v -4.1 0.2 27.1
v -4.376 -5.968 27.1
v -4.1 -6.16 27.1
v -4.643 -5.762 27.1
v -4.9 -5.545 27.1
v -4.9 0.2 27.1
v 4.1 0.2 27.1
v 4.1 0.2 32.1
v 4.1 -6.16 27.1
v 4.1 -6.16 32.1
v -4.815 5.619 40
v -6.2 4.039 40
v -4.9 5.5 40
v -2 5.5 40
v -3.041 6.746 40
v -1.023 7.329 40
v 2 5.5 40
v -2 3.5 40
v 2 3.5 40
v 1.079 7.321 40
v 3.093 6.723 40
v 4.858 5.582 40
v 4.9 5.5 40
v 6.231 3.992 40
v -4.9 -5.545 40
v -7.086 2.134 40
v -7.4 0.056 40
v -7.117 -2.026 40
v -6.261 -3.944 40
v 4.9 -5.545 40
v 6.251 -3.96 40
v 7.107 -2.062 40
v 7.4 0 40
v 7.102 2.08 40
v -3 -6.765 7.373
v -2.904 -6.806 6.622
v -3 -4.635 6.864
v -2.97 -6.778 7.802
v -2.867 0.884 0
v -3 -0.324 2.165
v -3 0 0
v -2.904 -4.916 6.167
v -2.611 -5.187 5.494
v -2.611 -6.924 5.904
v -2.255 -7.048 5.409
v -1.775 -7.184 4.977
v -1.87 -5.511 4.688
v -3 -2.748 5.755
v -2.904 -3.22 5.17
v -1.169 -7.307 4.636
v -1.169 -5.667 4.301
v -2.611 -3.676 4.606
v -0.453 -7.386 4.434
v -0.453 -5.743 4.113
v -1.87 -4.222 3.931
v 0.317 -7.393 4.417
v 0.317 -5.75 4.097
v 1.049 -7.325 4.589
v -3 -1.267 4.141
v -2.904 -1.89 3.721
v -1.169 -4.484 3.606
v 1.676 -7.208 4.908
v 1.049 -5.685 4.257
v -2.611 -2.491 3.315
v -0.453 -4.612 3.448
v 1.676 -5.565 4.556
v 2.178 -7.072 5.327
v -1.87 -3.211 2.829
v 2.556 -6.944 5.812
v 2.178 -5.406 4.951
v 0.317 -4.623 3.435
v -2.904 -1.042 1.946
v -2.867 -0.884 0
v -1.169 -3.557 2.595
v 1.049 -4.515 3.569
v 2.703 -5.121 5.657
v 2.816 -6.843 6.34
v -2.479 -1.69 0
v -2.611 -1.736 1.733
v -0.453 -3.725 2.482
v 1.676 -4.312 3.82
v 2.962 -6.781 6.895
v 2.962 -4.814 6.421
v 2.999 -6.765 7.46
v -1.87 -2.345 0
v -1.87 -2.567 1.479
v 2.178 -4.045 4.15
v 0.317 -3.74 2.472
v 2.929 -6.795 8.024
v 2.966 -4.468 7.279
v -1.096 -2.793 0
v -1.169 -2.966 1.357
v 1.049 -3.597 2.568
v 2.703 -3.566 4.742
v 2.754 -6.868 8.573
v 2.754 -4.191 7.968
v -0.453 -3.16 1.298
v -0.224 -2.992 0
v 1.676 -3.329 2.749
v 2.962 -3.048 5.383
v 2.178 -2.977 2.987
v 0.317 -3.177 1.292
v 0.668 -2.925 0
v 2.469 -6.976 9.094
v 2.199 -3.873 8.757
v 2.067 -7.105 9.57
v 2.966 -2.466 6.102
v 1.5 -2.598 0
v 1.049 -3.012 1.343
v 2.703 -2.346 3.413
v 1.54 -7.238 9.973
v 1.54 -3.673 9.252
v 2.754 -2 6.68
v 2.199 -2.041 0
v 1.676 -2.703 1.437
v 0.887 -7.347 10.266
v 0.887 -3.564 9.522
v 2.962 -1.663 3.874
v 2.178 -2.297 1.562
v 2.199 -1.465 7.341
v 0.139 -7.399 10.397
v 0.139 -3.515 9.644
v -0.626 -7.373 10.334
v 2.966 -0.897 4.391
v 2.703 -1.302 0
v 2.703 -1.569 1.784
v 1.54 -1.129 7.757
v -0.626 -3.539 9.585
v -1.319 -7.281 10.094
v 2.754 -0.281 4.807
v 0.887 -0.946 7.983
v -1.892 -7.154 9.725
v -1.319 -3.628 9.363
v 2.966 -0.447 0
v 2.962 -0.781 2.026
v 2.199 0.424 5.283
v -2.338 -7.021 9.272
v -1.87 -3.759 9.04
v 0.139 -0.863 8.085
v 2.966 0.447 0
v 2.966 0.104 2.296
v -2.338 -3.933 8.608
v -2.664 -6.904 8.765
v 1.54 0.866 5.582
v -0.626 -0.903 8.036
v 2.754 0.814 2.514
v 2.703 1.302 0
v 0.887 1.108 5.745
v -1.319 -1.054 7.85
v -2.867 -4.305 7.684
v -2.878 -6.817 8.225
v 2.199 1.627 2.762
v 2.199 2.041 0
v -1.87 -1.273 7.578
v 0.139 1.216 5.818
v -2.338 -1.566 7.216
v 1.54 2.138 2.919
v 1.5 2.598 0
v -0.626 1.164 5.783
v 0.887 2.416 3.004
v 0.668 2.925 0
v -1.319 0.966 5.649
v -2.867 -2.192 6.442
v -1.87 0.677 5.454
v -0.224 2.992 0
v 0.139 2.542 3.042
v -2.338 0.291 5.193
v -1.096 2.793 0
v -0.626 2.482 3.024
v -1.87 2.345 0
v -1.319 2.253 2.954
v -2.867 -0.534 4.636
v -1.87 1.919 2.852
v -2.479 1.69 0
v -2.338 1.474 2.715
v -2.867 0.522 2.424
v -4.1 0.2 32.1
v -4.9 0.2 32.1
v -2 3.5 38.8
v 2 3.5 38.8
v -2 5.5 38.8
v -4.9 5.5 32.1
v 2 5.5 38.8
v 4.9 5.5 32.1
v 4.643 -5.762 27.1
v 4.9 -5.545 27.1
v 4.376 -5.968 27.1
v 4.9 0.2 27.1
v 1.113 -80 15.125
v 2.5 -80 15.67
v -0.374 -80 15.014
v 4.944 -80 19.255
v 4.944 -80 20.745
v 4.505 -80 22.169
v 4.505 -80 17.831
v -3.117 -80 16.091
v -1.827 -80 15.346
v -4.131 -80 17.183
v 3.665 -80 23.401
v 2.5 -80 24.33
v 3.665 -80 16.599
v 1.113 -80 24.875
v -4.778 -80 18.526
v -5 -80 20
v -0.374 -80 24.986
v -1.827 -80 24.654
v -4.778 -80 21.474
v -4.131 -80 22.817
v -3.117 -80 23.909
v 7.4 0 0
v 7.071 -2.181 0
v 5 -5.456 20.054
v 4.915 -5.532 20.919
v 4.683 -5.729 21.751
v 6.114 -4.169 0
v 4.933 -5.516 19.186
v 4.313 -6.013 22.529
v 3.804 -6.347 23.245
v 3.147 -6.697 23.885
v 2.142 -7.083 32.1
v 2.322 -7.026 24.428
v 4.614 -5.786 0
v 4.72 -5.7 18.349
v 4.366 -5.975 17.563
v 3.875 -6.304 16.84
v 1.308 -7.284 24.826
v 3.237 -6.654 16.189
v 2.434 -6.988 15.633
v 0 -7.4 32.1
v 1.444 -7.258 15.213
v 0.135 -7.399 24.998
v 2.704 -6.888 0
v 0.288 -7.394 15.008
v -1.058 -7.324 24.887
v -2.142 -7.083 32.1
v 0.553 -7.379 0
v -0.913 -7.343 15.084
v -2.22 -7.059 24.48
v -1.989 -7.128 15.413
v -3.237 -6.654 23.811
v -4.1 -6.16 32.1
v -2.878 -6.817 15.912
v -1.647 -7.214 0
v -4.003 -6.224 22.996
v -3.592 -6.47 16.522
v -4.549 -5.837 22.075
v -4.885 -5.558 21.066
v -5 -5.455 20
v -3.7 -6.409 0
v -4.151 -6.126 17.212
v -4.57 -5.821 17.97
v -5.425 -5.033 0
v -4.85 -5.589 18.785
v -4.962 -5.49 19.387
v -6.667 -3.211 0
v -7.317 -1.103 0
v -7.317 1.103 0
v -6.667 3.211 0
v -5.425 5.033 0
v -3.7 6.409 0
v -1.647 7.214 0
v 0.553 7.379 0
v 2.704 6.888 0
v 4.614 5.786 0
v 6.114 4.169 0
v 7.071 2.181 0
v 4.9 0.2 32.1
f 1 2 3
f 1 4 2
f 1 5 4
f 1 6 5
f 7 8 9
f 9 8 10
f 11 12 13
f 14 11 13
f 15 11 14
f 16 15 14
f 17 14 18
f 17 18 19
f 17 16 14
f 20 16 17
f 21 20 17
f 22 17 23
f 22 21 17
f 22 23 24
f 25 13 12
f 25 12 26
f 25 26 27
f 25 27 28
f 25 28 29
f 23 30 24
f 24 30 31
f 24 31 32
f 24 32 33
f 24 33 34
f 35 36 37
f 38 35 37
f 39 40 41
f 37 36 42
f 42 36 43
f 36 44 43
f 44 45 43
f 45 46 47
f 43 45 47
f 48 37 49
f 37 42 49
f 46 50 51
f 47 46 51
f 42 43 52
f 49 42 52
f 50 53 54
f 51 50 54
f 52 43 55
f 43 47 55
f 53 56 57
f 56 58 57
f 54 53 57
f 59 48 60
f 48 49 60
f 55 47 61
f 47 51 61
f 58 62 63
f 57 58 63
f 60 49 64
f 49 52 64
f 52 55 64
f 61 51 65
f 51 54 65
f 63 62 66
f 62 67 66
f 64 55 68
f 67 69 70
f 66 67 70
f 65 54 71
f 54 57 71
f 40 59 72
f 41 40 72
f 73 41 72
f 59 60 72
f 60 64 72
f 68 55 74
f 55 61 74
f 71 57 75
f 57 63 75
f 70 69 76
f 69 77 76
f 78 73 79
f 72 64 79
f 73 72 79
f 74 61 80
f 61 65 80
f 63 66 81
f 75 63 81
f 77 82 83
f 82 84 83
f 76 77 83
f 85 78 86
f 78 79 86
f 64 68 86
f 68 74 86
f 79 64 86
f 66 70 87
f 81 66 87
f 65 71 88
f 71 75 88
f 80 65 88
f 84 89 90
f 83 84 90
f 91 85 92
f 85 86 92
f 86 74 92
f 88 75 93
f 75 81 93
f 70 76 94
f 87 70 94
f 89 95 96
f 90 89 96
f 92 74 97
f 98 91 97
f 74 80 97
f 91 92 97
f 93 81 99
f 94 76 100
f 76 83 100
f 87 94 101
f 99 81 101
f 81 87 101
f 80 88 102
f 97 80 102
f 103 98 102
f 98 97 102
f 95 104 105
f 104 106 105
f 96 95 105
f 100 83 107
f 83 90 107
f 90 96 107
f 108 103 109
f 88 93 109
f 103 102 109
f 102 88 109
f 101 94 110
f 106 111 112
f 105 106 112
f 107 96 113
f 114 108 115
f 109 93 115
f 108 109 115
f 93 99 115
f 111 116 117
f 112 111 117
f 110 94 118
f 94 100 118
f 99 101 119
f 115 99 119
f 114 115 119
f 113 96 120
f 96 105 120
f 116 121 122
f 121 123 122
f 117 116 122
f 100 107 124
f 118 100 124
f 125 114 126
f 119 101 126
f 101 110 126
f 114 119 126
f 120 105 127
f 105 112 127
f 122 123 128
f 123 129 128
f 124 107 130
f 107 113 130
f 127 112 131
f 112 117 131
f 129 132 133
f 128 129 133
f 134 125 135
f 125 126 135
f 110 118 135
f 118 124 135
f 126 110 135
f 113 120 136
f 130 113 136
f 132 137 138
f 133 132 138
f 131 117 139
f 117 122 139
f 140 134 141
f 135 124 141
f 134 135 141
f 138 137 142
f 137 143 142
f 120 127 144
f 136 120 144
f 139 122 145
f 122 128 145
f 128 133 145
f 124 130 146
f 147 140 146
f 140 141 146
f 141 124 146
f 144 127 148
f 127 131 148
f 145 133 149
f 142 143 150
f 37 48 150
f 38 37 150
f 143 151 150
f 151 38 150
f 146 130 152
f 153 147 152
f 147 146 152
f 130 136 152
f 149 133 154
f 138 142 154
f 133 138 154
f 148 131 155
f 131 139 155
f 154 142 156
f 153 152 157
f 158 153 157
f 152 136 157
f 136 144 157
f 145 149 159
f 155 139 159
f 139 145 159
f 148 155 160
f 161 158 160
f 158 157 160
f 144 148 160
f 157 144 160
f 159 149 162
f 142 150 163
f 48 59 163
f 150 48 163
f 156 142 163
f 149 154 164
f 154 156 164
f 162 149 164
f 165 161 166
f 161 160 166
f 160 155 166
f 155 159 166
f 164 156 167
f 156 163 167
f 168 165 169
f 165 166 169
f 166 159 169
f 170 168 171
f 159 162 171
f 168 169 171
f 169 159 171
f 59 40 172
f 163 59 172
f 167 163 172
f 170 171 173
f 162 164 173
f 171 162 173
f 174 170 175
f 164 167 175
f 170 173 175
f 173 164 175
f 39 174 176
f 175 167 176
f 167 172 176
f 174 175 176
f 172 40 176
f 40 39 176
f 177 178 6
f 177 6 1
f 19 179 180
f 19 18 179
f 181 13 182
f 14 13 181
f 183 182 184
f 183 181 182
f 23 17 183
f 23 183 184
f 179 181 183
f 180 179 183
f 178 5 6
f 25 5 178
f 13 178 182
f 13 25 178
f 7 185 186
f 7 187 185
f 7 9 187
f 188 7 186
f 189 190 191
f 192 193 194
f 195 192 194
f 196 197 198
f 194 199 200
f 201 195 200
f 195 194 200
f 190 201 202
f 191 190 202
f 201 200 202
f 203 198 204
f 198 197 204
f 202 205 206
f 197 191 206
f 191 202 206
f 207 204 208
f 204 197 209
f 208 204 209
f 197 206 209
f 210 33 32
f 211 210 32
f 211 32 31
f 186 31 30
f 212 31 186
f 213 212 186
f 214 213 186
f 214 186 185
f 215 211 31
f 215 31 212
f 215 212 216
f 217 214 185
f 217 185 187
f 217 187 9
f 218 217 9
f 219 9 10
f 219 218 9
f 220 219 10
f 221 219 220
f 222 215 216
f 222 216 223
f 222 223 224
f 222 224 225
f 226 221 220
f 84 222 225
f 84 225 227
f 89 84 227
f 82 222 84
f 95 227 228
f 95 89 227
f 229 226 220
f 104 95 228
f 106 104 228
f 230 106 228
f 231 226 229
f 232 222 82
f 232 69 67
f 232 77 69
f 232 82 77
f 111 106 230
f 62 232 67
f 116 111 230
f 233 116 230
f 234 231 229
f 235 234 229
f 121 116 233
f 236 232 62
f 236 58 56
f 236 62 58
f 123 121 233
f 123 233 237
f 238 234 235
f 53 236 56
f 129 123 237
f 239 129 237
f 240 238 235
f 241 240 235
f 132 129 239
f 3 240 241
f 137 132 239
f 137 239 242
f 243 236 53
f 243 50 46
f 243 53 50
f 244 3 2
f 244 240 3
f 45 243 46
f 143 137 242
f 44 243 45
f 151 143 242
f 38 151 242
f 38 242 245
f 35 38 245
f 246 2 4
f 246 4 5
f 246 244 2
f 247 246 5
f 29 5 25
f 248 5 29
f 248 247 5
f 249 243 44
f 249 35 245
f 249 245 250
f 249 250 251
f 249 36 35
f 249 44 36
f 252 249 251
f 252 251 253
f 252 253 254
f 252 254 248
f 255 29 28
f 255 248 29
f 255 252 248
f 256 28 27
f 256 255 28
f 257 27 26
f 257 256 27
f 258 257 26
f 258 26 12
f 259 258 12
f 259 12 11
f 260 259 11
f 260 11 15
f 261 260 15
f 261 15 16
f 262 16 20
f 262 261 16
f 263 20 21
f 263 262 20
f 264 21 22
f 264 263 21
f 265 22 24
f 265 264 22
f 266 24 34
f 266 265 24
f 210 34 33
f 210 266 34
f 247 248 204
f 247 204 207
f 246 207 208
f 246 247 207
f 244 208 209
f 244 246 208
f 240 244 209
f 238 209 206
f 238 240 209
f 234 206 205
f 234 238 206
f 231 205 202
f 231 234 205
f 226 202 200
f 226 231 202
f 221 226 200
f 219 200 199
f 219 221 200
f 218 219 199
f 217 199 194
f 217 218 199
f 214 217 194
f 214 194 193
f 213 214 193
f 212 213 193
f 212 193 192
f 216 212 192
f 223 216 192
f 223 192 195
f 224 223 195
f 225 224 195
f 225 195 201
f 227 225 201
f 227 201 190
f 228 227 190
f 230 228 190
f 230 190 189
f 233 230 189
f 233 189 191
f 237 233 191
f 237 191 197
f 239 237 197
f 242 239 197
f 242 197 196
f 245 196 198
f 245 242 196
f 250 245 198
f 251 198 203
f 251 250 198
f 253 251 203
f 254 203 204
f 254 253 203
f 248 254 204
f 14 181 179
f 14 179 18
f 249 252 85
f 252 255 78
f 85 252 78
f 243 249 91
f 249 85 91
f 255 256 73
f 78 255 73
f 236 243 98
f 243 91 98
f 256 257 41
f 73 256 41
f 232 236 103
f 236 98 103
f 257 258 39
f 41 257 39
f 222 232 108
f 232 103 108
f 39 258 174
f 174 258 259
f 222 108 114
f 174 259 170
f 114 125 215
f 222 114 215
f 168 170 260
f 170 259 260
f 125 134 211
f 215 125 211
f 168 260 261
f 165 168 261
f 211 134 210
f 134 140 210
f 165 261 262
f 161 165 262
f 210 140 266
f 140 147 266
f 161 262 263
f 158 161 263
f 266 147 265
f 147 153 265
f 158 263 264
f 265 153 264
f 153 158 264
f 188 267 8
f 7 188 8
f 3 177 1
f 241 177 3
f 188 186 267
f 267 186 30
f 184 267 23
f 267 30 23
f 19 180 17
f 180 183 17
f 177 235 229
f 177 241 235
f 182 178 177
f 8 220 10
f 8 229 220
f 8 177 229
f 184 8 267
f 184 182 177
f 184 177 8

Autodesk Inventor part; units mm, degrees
ref_plane "YZ Plane" through (0, 0, 0) normal (1, 0, 0) x (0, 1, 0)
ref_plane "XZ Plane" through (0, 0, 0) normal (0, 1, 0) x (-1, 0, 0)
ref_plane "XY Plane" through (0, 0, 0) normal (0, 0, 1) x (1, 0, 0)
sketch "Sketch1" plane through (0, 0, 0) normal (0, 0, 1) x (1, 0, 0)
  circle A0 centre (0, 0) radius 7.4
  dimension "d0" = 14.8
extrude "Extrusion1" add sketch "Sketch1" along normal blind 40
sketch "Sketch2" plane through (0, 0, 40) normal (0, 0, 1) x (1, 0, 0)
  line L0 (0, 0) -> (-4.9, 0)
  line L1 (0, 0) -> (4.9, 0)
  line L2 (0, 0) -> (0, 5.5)
  line L3 (0, 5.5) -> (-4.9, 5.5)
  line L4 (-4.9, 5.5) -> (-4.9, 0)
  line L5 (0, 5.5) -> (4.9, 5.5)
  line L6 (4.9, 5.5) -> (4.9, 0)
  line L7 (-4.9, 0) -> (-4.9, -10)
  line L8 (-4.9, -10) -> (4.9, -10)
  line L9 (4.9, -10) -> (4.9, 0)
  dimension "d3" = 4.9
  dimension "d4" = 4.9
  dimension "d5" = 5.5
  dimension "d6" = 10
extrude "Extrusion2" cut sketch "Sketch2" against normal blind 7.9
sketch "Sketch3" plane through (0, 0, 32.1) normal (0, 0, 1) x (1, 0, 0)
  line L0 (-4.9, -5.5453) -> (-4.9, 5.5) projected
  line L1 (-4.9, 5.5) -> (-4.9, 0.2)
  line L2 (-4.9, 0.2) -> (-4.1, 0.2)
  line L3 (-4.1, 0.2) -> (-4.1, -7.8)
  line L4 (-4.1, -7.8) -> (-4.9, -7.8)
  line L5 (-4.9, -7.8) -> (-4.9, 0.2)
  line L6 (4.9, 5.5) -> (4.9, -5.5453) projected
  line L7 (4.9, 5.5) -> (4.9, 0.2)
  line L8 (4.9, 0.2) -> (4.1, 0.2)
  line L9 (4.1, 0.2) -> (4.1, -7.8)
  line L10 (4.1, -7.8) -> (4.9, -7.8)
  line L11 (4.9, 0.2) -> (4.9, -7.8)
  point P0 (0, 0)
  dimension "d9" = 5.3
  dimension "d10" = 0.8
  dimension "d11" = 8
  dimension "d12" = 0.8
  dimension "d13" = 5.3
  dimension "d14" = 0.8
  dimension "d15" = 8
extrude "Extrusion3" cut sketch "Sketch3" against normal blind 5
sketch "Sketch4" plane through (-4.9, 5.5, 40) normal (0, -1, 0) x (1, 0, 0)
  line L0 (12.3, 0) -> (-2.5, 0) projected
  line L1 (6.9, 0) -> (2.9, 0)
  line L2 (4.9, 0) -> (4.9, -1.2)
  line L3 (4.9, -1.2) -> (6.9, -1.2)
  line L4 (6.9, -1.2) -> (6.9, 0)
  line L5 (4.9, -1.2) -> (2.9, -1.2)
  line L6 (2.9, -1.2) -> (2.9, 0)
  point P0 (4.9, -40)
  point P1 (9.8, 0)
  point P2 (0, 0)
  dimension "d18" = 1.2
  dimension "d19" = 2
  dimension "d20" = 2
extrude "Extrusion4" add sketch "Sketch4" along normal blind 2
sketch "Sketch5" plane through (0, 0, 0) normal (0, 1, 0) x (-1, 0, 0)
  line L0 (-7.4, 0) -> (-7.4, 40) projected
  line L1 (-7.4, 40) -> (-7.4, 0)
  line L2 (-7.4, 20) -> (7.4, 20)
  line L3 (7.4, 0) -> (7.4, 40) projected
  circle A0 centre (0, 20) radius 5
  point P0 (0, 0)
  dimension "d23" = 10
extrude "Extrusion5" add sketch "Sketch5" against normal blind 80
ref_plane "Work Plane1" through (4.9, -5.5453, 27.1) normal (0, -1, 0) x (1, 0, 0)
sketch "Sketch7" plane through (0, 0, 0) normal (0, 0, -1) x (-1, 0, 0)
  circle A0 centre (0, 0) radius 3
  dimension "d26" = 6
ref_plane "Work Plane2" through (0, 0, 0) normal (-1, 0, 0) x (0, 0, -1)
sketch "Sketch8" plane through (0, 0, 0) normal (-1, 0, 0) x (0, 0, -1)
  line L0 (0, -7.4) -> (0, 7.4) projected
  circle A0 centre (0, 7.4) radius 7.4
  point P0 (0, 0)
sweep "Sweep1" cut profiles "Sketch7" path "Sketch8" path curves A0
equation "\"BendRadius\" = Thickness"
equation "\"BendReliefWidth\" = Thickness"
equation "\"BendReliefDepth\" = 0.5 * Thickness"
equation "\"CornerReliefSize\" = 4 * Thickness"
equation "\"MinimumRemnant\" = 2 * Thickness"
equation "\"TransitionRadius\" = BendRadius"
equation "\"JacobiRadiusSize\" = BendRadius"
equation "\"GapSize\" = Thickness"
equation "\"Thickness\" = 0.5"
properties part number "rotor1"
